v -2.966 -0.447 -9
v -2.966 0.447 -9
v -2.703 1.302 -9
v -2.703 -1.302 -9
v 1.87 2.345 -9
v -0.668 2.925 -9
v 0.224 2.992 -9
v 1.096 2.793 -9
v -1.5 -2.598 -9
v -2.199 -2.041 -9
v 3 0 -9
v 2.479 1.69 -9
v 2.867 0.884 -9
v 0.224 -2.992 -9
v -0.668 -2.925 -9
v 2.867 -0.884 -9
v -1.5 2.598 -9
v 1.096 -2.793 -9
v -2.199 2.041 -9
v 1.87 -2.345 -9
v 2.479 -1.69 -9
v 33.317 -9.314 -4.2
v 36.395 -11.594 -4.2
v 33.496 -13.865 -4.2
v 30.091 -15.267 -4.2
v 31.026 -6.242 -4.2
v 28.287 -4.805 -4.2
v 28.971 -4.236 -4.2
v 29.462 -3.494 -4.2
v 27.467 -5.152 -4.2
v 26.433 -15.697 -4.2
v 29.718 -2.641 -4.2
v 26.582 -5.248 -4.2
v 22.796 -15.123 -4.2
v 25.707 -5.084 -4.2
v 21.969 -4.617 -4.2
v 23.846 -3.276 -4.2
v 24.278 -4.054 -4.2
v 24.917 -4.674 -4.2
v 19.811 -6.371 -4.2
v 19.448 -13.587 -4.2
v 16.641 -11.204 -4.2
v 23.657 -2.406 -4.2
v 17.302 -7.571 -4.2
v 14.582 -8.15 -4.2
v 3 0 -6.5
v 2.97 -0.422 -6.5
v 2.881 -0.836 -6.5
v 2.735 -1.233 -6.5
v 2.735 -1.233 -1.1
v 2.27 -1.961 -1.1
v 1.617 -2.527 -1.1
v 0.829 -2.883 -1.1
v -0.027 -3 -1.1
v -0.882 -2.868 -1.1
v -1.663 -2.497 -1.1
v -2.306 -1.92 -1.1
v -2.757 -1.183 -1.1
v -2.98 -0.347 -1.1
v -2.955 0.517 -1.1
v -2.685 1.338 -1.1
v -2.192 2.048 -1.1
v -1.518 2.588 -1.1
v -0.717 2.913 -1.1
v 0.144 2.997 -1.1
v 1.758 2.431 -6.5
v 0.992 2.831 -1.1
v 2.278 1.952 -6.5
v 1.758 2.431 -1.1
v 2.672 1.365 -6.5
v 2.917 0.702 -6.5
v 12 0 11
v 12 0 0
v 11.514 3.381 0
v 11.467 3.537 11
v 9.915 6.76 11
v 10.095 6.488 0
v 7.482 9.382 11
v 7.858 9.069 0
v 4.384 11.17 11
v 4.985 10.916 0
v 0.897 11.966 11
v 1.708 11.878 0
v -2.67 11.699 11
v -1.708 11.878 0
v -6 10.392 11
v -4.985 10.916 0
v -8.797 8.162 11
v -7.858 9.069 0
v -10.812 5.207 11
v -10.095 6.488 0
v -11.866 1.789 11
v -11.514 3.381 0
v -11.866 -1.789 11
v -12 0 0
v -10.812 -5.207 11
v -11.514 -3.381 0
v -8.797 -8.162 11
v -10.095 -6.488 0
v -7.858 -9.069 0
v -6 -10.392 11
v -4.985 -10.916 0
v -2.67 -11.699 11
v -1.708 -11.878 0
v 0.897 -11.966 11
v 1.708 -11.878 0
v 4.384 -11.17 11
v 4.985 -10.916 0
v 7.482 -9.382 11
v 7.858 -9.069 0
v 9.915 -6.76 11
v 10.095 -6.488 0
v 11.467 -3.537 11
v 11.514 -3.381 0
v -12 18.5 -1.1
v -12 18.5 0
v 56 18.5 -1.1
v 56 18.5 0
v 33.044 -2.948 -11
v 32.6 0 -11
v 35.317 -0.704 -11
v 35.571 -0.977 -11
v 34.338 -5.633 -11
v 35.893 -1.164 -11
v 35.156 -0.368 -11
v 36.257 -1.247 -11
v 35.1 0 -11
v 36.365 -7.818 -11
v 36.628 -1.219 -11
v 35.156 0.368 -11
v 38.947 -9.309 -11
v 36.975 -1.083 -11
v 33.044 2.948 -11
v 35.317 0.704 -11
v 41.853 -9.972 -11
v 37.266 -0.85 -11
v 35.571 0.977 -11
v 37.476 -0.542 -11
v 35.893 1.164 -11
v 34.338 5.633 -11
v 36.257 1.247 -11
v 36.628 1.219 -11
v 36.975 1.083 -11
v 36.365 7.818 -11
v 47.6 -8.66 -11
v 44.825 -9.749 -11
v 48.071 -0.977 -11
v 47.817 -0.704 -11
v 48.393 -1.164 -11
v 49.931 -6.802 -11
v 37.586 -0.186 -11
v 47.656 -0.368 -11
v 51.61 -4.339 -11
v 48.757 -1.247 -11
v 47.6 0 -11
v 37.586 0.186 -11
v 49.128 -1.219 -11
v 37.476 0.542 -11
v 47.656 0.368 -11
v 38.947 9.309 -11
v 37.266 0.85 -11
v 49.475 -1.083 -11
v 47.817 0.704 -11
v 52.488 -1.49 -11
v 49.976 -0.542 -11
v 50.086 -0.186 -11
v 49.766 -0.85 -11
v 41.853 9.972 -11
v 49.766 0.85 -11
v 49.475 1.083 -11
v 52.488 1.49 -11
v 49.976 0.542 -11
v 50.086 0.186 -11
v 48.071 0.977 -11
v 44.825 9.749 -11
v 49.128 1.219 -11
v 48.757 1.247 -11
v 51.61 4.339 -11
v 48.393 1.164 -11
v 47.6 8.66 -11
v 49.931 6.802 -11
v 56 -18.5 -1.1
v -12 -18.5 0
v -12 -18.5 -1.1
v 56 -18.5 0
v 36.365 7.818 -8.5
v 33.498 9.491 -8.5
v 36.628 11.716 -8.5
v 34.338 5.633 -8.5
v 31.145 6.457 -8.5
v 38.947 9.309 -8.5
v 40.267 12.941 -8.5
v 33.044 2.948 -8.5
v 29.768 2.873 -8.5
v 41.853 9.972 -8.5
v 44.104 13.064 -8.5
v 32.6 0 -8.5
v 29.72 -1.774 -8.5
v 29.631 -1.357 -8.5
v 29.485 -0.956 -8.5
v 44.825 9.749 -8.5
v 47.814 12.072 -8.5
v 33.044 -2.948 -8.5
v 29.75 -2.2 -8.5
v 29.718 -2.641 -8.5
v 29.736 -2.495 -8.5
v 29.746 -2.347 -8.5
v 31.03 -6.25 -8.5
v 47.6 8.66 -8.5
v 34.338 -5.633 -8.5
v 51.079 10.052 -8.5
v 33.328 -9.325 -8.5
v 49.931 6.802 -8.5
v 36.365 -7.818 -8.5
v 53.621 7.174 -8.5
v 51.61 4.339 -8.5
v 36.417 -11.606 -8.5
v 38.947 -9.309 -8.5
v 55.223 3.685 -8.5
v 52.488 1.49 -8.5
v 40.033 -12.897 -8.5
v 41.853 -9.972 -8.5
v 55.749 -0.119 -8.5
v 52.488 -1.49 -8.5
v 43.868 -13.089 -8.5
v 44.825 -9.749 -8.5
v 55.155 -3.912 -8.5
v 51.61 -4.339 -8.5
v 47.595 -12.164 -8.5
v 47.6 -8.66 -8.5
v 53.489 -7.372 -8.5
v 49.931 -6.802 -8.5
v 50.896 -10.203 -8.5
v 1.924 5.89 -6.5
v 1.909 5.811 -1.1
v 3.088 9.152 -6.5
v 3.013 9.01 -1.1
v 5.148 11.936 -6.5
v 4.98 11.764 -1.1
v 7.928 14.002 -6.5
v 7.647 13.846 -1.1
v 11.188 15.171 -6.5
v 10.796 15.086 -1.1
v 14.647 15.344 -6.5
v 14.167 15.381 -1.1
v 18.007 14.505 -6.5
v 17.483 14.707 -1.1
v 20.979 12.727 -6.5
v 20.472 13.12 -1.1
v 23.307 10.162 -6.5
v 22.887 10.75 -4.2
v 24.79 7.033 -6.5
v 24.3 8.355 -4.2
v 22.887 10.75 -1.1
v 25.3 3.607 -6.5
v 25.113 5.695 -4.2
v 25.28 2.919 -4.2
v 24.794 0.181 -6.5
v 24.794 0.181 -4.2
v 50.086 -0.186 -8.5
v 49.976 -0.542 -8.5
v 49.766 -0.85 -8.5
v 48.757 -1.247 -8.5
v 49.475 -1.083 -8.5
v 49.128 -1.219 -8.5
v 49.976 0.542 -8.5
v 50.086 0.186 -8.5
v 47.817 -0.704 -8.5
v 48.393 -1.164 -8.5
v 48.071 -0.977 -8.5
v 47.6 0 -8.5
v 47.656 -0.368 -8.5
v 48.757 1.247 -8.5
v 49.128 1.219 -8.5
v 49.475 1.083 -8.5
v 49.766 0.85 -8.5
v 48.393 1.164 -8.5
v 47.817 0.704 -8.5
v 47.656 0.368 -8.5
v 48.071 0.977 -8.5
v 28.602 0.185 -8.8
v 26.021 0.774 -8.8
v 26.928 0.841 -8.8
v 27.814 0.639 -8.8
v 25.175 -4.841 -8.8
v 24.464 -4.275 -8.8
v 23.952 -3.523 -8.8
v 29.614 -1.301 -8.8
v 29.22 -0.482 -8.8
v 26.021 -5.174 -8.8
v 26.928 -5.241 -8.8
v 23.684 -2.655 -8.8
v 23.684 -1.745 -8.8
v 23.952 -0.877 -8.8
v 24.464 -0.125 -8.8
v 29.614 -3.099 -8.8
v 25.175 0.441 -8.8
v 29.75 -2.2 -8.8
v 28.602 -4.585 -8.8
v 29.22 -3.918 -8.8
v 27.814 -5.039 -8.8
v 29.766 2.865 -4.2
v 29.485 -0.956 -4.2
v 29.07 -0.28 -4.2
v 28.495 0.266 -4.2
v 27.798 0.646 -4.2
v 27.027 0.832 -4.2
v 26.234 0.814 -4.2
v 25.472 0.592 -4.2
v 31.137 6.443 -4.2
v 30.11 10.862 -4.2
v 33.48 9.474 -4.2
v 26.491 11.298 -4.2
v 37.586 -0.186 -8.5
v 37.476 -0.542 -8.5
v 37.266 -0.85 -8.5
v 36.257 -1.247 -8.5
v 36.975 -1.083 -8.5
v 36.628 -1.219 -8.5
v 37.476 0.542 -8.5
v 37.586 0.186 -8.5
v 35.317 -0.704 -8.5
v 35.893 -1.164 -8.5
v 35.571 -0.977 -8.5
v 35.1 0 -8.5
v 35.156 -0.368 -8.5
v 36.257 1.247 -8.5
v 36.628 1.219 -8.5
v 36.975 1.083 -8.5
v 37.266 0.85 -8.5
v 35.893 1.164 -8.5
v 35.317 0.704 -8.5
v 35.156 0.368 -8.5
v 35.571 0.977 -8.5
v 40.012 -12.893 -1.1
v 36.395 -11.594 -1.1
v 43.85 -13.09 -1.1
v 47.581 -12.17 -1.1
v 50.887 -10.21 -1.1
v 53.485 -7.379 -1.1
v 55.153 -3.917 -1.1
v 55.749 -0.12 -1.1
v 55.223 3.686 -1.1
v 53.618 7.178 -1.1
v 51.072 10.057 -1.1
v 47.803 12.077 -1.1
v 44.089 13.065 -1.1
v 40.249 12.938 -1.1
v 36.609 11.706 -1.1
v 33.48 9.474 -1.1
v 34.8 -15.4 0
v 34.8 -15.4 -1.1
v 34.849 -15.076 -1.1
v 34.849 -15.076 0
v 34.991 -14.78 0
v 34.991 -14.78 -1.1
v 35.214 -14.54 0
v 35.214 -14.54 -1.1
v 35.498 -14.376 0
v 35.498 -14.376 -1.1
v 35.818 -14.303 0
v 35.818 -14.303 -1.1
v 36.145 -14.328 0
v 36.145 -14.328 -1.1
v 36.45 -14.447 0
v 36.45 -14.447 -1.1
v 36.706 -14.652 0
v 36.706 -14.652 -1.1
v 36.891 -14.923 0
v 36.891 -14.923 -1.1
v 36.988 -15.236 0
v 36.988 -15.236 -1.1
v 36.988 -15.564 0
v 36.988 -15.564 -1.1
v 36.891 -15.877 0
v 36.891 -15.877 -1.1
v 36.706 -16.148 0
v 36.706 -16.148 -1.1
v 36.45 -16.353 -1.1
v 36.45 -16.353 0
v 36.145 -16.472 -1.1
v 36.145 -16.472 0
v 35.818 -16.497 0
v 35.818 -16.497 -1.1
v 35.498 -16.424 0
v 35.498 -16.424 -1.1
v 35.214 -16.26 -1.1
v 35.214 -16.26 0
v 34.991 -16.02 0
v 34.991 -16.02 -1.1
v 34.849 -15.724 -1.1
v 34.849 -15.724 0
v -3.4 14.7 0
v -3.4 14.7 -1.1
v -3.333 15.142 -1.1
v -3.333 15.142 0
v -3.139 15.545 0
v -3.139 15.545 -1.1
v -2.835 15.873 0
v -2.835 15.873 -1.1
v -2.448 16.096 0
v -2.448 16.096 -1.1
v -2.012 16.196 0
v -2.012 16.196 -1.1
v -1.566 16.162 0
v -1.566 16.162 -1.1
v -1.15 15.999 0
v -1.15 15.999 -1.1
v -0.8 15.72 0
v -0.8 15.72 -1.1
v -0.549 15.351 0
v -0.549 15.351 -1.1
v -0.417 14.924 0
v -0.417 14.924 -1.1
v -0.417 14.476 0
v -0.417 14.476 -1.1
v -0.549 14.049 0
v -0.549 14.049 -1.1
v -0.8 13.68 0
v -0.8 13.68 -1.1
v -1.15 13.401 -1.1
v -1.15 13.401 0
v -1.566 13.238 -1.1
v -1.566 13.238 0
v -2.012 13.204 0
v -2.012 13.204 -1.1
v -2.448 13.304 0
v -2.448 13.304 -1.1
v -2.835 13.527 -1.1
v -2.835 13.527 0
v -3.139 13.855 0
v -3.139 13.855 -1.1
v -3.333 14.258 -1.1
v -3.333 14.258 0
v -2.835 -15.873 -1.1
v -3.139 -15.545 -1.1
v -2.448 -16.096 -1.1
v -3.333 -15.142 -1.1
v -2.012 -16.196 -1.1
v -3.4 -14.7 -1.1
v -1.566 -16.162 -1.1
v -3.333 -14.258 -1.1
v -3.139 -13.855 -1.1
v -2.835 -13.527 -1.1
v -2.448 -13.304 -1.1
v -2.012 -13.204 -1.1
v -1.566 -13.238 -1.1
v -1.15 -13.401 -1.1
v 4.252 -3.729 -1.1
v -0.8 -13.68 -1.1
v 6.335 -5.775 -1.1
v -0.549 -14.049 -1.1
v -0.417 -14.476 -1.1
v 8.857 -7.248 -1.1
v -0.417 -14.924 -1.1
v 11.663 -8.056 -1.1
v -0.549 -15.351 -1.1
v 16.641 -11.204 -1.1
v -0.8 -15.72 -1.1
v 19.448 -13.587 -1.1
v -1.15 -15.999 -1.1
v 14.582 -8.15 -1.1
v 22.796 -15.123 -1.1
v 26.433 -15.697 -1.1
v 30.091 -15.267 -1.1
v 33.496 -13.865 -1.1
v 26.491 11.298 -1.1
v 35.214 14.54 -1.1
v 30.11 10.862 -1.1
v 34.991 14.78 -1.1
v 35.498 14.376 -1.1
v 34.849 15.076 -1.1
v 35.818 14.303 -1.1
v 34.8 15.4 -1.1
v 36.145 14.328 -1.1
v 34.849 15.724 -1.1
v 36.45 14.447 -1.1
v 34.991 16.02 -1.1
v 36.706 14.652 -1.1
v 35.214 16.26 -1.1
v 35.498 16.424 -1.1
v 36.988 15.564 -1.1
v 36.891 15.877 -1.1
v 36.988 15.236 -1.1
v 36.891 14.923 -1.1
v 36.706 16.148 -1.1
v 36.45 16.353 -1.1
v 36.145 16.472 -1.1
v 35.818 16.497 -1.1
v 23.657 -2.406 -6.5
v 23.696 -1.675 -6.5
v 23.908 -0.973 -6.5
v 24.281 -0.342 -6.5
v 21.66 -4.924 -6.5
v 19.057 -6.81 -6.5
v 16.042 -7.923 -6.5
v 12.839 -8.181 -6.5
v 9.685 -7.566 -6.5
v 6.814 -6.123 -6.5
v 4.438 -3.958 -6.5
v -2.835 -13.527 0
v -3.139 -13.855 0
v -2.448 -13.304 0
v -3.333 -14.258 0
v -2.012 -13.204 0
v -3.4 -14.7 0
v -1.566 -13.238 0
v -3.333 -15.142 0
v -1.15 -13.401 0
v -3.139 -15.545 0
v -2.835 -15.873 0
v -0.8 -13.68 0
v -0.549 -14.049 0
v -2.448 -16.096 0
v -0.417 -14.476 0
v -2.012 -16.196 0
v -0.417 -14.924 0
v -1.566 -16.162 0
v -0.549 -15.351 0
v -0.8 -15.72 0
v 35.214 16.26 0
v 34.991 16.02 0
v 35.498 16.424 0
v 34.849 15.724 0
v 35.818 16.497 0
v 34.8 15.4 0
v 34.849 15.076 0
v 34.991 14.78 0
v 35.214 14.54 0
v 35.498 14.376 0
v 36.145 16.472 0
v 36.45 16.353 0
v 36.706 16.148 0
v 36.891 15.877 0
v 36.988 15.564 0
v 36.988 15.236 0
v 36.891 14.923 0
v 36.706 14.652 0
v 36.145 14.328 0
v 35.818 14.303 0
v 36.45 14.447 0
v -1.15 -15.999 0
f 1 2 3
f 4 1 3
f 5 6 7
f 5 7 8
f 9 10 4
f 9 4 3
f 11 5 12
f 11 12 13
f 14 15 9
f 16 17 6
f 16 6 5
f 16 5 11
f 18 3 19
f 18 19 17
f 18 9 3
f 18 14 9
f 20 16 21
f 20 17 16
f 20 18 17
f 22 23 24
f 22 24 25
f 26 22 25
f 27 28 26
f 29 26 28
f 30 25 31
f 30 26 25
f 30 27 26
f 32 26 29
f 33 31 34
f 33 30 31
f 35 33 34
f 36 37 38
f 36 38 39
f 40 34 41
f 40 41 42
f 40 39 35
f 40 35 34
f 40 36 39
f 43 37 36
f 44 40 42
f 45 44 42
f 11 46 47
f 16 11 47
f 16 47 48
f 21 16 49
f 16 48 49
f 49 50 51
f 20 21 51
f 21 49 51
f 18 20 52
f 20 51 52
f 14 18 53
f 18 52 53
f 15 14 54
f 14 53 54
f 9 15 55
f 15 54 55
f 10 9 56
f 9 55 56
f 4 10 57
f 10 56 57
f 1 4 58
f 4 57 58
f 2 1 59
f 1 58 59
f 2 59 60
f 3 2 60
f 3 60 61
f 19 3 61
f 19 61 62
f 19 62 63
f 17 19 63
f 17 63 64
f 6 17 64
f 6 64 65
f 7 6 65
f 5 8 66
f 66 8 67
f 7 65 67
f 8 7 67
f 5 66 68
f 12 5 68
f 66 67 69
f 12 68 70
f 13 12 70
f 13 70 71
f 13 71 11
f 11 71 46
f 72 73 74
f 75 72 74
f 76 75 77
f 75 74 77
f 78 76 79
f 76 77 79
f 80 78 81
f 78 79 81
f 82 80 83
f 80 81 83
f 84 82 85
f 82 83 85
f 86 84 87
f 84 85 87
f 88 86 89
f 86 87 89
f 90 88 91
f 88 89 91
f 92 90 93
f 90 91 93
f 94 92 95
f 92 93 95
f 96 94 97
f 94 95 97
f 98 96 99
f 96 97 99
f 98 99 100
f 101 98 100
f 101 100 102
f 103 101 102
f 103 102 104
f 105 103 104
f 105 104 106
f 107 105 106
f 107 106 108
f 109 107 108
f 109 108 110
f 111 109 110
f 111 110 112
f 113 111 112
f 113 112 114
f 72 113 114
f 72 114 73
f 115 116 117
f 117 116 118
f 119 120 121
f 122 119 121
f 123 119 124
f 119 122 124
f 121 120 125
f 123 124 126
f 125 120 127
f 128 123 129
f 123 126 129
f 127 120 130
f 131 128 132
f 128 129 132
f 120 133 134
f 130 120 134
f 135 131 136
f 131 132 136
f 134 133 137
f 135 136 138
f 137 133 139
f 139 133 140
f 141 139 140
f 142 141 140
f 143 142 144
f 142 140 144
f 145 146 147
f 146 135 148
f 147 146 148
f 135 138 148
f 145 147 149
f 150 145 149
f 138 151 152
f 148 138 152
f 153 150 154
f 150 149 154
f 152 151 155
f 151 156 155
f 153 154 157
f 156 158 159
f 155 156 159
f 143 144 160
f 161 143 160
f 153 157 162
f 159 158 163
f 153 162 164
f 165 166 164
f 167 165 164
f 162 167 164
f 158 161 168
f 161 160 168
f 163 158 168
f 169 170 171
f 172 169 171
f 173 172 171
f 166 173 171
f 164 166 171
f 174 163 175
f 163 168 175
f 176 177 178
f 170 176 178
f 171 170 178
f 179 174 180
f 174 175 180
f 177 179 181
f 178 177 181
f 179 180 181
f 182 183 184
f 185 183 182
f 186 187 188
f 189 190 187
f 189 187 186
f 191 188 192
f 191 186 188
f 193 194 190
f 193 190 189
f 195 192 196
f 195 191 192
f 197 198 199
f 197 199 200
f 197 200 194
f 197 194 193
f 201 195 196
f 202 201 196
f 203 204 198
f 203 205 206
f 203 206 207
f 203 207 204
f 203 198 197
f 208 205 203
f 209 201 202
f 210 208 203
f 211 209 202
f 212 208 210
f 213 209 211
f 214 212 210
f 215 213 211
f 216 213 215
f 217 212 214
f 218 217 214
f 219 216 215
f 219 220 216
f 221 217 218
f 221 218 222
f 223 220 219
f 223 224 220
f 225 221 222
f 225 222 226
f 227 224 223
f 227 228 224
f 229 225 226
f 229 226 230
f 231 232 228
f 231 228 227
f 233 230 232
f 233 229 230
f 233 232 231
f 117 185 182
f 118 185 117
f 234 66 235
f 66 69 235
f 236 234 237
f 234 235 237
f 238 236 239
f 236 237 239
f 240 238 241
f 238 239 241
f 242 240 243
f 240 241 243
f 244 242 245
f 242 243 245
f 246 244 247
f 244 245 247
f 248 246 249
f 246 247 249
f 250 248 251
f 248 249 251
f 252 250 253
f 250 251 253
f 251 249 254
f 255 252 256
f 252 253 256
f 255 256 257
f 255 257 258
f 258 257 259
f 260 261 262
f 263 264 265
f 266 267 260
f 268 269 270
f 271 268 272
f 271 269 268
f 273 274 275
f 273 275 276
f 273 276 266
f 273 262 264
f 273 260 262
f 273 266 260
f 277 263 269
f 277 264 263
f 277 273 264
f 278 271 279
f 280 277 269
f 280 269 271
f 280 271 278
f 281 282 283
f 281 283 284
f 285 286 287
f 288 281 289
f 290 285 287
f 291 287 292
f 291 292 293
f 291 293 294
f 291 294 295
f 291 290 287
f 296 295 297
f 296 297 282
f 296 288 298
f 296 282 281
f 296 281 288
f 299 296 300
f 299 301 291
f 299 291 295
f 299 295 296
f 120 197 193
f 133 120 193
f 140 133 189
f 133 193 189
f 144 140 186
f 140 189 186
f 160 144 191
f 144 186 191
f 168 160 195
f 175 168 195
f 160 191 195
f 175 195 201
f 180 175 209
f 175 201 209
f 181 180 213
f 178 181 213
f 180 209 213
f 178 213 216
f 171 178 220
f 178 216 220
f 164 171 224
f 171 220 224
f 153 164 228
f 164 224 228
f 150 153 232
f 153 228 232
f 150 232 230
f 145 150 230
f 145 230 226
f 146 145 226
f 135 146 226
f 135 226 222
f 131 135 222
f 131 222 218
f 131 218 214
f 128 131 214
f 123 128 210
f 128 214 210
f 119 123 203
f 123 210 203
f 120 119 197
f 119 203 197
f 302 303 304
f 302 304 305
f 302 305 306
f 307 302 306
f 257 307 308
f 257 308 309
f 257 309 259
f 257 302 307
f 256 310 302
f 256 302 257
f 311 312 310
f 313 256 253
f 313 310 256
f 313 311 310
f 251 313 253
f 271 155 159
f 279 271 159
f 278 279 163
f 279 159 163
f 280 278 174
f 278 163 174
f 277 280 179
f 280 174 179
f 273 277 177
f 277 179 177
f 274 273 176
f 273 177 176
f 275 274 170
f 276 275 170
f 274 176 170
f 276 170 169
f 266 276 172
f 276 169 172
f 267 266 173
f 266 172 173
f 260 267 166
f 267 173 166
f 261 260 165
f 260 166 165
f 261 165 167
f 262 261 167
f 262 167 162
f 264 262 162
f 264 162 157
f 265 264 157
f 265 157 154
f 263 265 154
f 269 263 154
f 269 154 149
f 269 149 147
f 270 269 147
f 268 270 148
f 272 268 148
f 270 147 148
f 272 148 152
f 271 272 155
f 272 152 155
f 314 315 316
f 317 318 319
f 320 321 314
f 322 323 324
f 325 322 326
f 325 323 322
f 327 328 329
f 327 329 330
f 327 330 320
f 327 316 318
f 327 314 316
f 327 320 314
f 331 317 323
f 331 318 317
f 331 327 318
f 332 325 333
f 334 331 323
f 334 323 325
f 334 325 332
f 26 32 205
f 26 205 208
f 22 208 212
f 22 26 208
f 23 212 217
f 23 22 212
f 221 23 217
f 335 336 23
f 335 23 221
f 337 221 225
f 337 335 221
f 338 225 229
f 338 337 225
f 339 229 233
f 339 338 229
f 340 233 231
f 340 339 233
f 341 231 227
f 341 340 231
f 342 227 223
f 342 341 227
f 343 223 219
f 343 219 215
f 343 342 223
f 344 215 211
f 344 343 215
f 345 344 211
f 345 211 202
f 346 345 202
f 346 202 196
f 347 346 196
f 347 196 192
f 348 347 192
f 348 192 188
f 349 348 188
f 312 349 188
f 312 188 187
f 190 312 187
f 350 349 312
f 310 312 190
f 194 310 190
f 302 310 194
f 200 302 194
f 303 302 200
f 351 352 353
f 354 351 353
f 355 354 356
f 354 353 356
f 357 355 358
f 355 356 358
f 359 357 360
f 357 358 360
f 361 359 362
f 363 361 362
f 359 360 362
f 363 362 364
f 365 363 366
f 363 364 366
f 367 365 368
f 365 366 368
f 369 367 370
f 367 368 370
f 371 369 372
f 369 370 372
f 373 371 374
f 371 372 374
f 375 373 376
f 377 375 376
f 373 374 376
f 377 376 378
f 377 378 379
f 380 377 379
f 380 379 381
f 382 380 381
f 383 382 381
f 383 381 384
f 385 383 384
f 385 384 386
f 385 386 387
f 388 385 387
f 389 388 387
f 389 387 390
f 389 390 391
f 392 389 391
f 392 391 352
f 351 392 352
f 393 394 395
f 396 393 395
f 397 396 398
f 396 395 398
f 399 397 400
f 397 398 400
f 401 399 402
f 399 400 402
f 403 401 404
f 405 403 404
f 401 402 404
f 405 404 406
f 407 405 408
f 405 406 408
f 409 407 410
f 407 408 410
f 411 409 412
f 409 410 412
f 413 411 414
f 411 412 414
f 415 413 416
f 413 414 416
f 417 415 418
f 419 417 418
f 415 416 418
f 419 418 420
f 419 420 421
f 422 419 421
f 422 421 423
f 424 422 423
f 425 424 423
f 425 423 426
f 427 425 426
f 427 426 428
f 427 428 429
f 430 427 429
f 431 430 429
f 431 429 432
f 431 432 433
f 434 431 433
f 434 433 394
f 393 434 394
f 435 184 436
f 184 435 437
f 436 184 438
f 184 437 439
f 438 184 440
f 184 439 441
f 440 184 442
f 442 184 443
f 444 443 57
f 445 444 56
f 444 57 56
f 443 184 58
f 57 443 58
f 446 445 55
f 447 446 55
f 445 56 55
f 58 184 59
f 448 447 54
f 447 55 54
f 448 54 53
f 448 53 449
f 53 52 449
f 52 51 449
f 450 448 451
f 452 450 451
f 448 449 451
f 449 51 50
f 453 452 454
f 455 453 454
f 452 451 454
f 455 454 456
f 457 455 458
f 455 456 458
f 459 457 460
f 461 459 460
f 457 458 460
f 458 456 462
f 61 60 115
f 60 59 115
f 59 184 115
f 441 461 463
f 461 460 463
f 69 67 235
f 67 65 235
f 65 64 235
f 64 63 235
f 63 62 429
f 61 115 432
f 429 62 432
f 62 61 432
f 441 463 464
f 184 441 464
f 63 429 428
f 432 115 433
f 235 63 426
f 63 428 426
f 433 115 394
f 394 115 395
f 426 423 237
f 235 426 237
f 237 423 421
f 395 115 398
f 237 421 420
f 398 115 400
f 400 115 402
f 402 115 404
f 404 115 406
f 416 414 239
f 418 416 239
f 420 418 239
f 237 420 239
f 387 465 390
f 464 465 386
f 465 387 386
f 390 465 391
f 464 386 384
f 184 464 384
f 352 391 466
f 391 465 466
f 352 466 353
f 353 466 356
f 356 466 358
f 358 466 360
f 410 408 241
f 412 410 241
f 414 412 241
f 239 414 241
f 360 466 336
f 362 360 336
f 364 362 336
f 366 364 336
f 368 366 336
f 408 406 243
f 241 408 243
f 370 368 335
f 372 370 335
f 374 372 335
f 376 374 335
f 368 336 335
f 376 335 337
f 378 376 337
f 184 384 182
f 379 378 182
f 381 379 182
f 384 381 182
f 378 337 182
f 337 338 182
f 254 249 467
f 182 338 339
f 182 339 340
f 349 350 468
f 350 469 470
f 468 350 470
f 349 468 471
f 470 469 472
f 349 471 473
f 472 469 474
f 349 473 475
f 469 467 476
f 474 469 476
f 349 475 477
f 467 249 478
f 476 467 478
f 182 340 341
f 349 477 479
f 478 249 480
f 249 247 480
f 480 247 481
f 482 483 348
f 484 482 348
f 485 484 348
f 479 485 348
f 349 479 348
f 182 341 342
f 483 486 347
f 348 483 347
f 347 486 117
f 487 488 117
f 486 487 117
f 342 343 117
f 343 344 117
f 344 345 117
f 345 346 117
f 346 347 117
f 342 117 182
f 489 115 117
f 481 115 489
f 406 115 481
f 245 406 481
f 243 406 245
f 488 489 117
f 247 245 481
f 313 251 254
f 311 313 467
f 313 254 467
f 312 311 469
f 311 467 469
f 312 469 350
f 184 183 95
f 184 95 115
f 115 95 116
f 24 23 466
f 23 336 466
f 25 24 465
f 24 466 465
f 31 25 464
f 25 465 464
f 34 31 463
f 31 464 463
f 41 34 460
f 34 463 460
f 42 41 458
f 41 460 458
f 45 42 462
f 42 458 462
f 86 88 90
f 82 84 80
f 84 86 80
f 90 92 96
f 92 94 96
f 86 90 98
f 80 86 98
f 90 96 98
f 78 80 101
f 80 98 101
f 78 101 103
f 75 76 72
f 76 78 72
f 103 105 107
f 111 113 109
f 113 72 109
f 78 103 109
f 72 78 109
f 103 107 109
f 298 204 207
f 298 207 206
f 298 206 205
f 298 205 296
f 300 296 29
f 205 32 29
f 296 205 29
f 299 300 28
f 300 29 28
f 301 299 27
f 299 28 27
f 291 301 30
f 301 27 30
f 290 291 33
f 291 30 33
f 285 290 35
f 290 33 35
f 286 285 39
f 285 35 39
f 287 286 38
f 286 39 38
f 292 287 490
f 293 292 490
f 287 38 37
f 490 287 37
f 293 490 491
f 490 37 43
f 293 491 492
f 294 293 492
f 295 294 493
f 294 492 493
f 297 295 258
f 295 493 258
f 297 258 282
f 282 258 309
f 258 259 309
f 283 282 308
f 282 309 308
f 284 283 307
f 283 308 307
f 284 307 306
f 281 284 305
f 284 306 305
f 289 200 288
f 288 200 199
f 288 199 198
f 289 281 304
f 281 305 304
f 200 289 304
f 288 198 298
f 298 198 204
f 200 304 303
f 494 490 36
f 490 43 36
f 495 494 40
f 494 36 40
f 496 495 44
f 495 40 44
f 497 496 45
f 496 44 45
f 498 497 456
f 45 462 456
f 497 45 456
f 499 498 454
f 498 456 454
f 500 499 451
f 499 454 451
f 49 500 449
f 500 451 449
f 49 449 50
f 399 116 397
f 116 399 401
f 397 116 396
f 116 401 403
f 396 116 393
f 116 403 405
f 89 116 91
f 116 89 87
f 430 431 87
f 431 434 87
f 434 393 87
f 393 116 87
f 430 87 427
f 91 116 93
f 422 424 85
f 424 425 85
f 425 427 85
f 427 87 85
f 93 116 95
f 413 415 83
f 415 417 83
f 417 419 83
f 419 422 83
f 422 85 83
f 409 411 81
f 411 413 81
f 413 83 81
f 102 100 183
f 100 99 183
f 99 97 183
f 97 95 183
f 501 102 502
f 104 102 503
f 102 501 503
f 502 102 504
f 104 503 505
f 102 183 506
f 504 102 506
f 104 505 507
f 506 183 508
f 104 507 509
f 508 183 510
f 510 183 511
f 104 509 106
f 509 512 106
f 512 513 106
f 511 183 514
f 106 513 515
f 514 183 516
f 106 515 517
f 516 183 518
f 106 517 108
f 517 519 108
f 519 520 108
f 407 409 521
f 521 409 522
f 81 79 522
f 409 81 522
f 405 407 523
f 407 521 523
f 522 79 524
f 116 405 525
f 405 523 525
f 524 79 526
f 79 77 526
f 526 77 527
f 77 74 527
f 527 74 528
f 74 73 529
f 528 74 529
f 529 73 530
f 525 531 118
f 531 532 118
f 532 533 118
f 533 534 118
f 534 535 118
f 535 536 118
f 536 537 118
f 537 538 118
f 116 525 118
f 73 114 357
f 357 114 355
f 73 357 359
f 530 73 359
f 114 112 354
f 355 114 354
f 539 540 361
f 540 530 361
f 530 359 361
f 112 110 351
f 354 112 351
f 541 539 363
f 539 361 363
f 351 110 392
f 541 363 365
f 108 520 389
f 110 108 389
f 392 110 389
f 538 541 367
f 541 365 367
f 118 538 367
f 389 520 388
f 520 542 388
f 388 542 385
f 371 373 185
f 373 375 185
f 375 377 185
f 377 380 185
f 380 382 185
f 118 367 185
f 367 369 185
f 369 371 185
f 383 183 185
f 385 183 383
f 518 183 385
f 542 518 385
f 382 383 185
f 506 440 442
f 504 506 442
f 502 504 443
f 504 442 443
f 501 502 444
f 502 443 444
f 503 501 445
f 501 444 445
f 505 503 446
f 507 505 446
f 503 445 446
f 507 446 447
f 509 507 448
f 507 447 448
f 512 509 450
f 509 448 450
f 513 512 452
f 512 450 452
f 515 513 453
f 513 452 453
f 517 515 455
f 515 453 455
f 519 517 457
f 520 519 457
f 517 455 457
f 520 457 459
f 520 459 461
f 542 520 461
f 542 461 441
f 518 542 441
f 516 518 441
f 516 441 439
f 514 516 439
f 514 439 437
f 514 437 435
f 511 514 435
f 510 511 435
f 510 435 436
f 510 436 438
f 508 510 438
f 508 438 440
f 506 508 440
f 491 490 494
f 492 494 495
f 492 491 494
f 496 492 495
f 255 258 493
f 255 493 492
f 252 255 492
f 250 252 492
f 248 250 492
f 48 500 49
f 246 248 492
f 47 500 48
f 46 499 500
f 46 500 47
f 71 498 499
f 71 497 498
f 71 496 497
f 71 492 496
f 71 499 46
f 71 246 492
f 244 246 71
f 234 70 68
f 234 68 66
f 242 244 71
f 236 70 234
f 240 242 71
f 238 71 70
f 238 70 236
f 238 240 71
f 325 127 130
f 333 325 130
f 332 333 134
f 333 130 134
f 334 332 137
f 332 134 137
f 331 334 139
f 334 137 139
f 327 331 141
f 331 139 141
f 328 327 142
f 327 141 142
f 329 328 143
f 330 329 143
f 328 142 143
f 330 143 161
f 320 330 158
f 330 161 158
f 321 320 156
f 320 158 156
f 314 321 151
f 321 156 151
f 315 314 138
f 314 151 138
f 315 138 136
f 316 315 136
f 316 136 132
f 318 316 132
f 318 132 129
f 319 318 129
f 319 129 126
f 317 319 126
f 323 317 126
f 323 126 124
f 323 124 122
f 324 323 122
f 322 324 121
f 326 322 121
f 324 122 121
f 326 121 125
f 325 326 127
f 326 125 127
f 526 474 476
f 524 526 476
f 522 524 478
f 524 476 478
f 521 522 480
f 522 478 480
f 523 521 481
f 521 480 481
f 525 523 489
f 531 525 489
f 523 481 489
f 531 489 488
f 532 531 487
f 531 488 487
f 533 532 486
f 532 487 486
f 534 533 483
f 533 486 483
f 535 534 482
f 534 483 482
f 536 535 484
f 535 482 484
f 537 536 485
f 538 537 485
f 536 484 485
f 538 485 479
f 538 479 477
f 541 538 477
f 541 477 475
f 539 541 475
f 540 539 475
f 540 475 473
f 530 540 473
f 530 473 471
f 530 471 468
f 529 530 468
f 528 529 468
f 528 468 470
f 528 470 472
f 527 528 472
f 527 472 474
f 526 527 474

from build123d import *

# Parameters (mm, degrees)
SKETCH_1_R          = 12
EXTRUDE_1_DEPTH     = 11
EXTRUDE_START       = -11
SKETCH_2_R          = 3
EXTRUDE_2_DEPTH     = 20
SKETCH_3_W          = 68
SKETCH_3_H          = 37
EXTRUDE_3_DEPTH     = 1.1
SKETCH_3_3_R        = 13.15
EXTRUDE_4_DEPTH     = 11
CUT_EXTRUDE_START   = -2.5
SKETCH_5_R          = 13.15
SKETCH_5_R_2        = 10
CUT_EXTRUDE_2_DEPTH = 2.5
EXTRUDE_START_2     = -1.1
SKETCH_6_R          = 11.8
EXTRUDE_5_DEPTH     = 6.5
SKETCH_6_3_R        = 13.5
EXTRUDE_6_DEPTH     = 4.2
SKETCH_6_4_R        = 3.05
EXTRUDE_7_DEPTH     = 8.8
SKETCH_4_R          = 1.5
SKETCH_4_R_2        = 1.1
CUT_EXTRUDE_1_DEPTH = 61.205149281
SKETCH_7_R          = 1.25
CUT_EXTRUDE_3_DEPTH = 2.5


with BuildPart() as part:
    # 草图1 → 凸台-拉伸1 (new body)
    with BuildSketch(Plane.XY):
        Circle(SKETCH_1_R)
    extrude(amount=EXTRUDE_1_DEPTH)

    # 草图2 → 凸台-拉伸2 (add)
    with BuildSketch(Plane(origin=(0, 0, 0), x_dir=(-1, 0, 0), z_dir=(0, 0, -1)).offset(EXTRUDE_START)):
        with Locations(Location((0, 0, 0), (0, 0, 180))):
            Circle(SKETCH_2_R)
    extrude(amount=EXTRUDE_2_DEPTH)

    # 草图3 → 凸台-拉伸3 (add)
    with BuildSketch(Plane.XY):
        with Locations((22, 0)):
            Rectangle(SKETCH_3_W, SKETCH_3_H)
    extrude(amount=-EXTRUDE_3_DEPTH)

    # 草图3<3> → 凸台-拉伸4 (add)
    with BuildSketch(Plane.XY):
        with Locations((42.6, 0)):
            Circle(SKETCH_3_3_R)
    extrude(amount=-EXTRUDE_4_DEPTH)

    # 草图5 → 切除-拉伸2 (cut)
    with BuildSketch(Plane(origin=(0, 0, -11), x_dir=(-1, 0, 0), z_dir=(0, 0, -1)).offset(CUT_EXTRUDE_START)):
        with Locations(Location((-42.6, 0, 0), (0, 0, 180))):
            Circle(SKETCH_5_R)
        with Locations((-42.6, 0)):
            Circle(SKETCH_5_R_2, mode=Mode.SUBTRACT)
    extrude(amount=CUT_EXTRUDE_2_DEPTH, mode=Mode.SUBTRACT)

    # 草图6 → 凸台-拉伸5 (add)
    with BuildSketch(Plane(origin=(0, 0, -1.1), x_dir=(-1, 0, 0), z_dir=(0, 0, -1)).offset(EXTRUDE_START_2)):
        with Locations((-13.5, 3.6)):
            Circle(SKETCH_6_R)
    extrude(amount=EXTRUDE_5_DEPTH)

    # 草图6<3> → 凸台-拉伸6 (add)
    with BuildSketch(Plane(origin=(0, 0, -1.1), x_dir=(-1, 0, 0), z_dir=(0, 0, -1)).offset(EXTRUDE_START_2)):
        with Locations((-26.7, -2.2)):
            Circle(SKETCH_6_3_R)
    extrude(amount=EXTRUDE_6_DEPTH)

    # 草图6<4> → 凸台-拉伸7 (add)
    with BuildSketch(Plane(origin=(0, 0, -1.1), x_dir=(-1, 0, 0), z_dir=(0, 0, -1)).offset(EXTRUDE_START_2)):
        with Locations(Location((-26.7, -2.2, 0), (0, 0, 180))):
            Circle(SKETCH_6_4_R)
    extrude(amount=EXTRUDE_7_DEPTH)

    # 草图4 → 切除-拉伸1 (cut, through all)
    with BuildSketch(Plane(origin=(0, 0, -1.1), x_dir=(-1, 0, 0), z_dir=(0, 0, -1))):
        with Locations((1.9, 14.7)):
            Circle(SKETCH_4_R)
        with Locations((1.9, -14.7)):
            Circle(SKETCH_4_R)
        with Locations((-35.9, 15.4)):
            Circle(SKETCH_4_R_2)
        with Locations((-35.9, -15.4)):
            Circle(SKETCH_4_R_2)
    extrude(amount=-CUT_EXTRUDE_1_DEPTH, mode=Mode.SUBTRACT)

    # 草图7 → 切除-拉伸3 (cut)
    with BuildSketch(Plane(origin=(0, 0, -11), x_dir=(-1, 0, 0), z_dir=(0, 0, -1))):
        with Locations((-48.85, 0)):
            Circle(SKETCH_7_R)
        with Locations((-36.35, 0)):
            Circle(SKETCH_7_R)
    extrude(amount=-CUT_EXTRUDE_3_DEPTH, mode=Mode.SUBTRACT)


solid = part.part
